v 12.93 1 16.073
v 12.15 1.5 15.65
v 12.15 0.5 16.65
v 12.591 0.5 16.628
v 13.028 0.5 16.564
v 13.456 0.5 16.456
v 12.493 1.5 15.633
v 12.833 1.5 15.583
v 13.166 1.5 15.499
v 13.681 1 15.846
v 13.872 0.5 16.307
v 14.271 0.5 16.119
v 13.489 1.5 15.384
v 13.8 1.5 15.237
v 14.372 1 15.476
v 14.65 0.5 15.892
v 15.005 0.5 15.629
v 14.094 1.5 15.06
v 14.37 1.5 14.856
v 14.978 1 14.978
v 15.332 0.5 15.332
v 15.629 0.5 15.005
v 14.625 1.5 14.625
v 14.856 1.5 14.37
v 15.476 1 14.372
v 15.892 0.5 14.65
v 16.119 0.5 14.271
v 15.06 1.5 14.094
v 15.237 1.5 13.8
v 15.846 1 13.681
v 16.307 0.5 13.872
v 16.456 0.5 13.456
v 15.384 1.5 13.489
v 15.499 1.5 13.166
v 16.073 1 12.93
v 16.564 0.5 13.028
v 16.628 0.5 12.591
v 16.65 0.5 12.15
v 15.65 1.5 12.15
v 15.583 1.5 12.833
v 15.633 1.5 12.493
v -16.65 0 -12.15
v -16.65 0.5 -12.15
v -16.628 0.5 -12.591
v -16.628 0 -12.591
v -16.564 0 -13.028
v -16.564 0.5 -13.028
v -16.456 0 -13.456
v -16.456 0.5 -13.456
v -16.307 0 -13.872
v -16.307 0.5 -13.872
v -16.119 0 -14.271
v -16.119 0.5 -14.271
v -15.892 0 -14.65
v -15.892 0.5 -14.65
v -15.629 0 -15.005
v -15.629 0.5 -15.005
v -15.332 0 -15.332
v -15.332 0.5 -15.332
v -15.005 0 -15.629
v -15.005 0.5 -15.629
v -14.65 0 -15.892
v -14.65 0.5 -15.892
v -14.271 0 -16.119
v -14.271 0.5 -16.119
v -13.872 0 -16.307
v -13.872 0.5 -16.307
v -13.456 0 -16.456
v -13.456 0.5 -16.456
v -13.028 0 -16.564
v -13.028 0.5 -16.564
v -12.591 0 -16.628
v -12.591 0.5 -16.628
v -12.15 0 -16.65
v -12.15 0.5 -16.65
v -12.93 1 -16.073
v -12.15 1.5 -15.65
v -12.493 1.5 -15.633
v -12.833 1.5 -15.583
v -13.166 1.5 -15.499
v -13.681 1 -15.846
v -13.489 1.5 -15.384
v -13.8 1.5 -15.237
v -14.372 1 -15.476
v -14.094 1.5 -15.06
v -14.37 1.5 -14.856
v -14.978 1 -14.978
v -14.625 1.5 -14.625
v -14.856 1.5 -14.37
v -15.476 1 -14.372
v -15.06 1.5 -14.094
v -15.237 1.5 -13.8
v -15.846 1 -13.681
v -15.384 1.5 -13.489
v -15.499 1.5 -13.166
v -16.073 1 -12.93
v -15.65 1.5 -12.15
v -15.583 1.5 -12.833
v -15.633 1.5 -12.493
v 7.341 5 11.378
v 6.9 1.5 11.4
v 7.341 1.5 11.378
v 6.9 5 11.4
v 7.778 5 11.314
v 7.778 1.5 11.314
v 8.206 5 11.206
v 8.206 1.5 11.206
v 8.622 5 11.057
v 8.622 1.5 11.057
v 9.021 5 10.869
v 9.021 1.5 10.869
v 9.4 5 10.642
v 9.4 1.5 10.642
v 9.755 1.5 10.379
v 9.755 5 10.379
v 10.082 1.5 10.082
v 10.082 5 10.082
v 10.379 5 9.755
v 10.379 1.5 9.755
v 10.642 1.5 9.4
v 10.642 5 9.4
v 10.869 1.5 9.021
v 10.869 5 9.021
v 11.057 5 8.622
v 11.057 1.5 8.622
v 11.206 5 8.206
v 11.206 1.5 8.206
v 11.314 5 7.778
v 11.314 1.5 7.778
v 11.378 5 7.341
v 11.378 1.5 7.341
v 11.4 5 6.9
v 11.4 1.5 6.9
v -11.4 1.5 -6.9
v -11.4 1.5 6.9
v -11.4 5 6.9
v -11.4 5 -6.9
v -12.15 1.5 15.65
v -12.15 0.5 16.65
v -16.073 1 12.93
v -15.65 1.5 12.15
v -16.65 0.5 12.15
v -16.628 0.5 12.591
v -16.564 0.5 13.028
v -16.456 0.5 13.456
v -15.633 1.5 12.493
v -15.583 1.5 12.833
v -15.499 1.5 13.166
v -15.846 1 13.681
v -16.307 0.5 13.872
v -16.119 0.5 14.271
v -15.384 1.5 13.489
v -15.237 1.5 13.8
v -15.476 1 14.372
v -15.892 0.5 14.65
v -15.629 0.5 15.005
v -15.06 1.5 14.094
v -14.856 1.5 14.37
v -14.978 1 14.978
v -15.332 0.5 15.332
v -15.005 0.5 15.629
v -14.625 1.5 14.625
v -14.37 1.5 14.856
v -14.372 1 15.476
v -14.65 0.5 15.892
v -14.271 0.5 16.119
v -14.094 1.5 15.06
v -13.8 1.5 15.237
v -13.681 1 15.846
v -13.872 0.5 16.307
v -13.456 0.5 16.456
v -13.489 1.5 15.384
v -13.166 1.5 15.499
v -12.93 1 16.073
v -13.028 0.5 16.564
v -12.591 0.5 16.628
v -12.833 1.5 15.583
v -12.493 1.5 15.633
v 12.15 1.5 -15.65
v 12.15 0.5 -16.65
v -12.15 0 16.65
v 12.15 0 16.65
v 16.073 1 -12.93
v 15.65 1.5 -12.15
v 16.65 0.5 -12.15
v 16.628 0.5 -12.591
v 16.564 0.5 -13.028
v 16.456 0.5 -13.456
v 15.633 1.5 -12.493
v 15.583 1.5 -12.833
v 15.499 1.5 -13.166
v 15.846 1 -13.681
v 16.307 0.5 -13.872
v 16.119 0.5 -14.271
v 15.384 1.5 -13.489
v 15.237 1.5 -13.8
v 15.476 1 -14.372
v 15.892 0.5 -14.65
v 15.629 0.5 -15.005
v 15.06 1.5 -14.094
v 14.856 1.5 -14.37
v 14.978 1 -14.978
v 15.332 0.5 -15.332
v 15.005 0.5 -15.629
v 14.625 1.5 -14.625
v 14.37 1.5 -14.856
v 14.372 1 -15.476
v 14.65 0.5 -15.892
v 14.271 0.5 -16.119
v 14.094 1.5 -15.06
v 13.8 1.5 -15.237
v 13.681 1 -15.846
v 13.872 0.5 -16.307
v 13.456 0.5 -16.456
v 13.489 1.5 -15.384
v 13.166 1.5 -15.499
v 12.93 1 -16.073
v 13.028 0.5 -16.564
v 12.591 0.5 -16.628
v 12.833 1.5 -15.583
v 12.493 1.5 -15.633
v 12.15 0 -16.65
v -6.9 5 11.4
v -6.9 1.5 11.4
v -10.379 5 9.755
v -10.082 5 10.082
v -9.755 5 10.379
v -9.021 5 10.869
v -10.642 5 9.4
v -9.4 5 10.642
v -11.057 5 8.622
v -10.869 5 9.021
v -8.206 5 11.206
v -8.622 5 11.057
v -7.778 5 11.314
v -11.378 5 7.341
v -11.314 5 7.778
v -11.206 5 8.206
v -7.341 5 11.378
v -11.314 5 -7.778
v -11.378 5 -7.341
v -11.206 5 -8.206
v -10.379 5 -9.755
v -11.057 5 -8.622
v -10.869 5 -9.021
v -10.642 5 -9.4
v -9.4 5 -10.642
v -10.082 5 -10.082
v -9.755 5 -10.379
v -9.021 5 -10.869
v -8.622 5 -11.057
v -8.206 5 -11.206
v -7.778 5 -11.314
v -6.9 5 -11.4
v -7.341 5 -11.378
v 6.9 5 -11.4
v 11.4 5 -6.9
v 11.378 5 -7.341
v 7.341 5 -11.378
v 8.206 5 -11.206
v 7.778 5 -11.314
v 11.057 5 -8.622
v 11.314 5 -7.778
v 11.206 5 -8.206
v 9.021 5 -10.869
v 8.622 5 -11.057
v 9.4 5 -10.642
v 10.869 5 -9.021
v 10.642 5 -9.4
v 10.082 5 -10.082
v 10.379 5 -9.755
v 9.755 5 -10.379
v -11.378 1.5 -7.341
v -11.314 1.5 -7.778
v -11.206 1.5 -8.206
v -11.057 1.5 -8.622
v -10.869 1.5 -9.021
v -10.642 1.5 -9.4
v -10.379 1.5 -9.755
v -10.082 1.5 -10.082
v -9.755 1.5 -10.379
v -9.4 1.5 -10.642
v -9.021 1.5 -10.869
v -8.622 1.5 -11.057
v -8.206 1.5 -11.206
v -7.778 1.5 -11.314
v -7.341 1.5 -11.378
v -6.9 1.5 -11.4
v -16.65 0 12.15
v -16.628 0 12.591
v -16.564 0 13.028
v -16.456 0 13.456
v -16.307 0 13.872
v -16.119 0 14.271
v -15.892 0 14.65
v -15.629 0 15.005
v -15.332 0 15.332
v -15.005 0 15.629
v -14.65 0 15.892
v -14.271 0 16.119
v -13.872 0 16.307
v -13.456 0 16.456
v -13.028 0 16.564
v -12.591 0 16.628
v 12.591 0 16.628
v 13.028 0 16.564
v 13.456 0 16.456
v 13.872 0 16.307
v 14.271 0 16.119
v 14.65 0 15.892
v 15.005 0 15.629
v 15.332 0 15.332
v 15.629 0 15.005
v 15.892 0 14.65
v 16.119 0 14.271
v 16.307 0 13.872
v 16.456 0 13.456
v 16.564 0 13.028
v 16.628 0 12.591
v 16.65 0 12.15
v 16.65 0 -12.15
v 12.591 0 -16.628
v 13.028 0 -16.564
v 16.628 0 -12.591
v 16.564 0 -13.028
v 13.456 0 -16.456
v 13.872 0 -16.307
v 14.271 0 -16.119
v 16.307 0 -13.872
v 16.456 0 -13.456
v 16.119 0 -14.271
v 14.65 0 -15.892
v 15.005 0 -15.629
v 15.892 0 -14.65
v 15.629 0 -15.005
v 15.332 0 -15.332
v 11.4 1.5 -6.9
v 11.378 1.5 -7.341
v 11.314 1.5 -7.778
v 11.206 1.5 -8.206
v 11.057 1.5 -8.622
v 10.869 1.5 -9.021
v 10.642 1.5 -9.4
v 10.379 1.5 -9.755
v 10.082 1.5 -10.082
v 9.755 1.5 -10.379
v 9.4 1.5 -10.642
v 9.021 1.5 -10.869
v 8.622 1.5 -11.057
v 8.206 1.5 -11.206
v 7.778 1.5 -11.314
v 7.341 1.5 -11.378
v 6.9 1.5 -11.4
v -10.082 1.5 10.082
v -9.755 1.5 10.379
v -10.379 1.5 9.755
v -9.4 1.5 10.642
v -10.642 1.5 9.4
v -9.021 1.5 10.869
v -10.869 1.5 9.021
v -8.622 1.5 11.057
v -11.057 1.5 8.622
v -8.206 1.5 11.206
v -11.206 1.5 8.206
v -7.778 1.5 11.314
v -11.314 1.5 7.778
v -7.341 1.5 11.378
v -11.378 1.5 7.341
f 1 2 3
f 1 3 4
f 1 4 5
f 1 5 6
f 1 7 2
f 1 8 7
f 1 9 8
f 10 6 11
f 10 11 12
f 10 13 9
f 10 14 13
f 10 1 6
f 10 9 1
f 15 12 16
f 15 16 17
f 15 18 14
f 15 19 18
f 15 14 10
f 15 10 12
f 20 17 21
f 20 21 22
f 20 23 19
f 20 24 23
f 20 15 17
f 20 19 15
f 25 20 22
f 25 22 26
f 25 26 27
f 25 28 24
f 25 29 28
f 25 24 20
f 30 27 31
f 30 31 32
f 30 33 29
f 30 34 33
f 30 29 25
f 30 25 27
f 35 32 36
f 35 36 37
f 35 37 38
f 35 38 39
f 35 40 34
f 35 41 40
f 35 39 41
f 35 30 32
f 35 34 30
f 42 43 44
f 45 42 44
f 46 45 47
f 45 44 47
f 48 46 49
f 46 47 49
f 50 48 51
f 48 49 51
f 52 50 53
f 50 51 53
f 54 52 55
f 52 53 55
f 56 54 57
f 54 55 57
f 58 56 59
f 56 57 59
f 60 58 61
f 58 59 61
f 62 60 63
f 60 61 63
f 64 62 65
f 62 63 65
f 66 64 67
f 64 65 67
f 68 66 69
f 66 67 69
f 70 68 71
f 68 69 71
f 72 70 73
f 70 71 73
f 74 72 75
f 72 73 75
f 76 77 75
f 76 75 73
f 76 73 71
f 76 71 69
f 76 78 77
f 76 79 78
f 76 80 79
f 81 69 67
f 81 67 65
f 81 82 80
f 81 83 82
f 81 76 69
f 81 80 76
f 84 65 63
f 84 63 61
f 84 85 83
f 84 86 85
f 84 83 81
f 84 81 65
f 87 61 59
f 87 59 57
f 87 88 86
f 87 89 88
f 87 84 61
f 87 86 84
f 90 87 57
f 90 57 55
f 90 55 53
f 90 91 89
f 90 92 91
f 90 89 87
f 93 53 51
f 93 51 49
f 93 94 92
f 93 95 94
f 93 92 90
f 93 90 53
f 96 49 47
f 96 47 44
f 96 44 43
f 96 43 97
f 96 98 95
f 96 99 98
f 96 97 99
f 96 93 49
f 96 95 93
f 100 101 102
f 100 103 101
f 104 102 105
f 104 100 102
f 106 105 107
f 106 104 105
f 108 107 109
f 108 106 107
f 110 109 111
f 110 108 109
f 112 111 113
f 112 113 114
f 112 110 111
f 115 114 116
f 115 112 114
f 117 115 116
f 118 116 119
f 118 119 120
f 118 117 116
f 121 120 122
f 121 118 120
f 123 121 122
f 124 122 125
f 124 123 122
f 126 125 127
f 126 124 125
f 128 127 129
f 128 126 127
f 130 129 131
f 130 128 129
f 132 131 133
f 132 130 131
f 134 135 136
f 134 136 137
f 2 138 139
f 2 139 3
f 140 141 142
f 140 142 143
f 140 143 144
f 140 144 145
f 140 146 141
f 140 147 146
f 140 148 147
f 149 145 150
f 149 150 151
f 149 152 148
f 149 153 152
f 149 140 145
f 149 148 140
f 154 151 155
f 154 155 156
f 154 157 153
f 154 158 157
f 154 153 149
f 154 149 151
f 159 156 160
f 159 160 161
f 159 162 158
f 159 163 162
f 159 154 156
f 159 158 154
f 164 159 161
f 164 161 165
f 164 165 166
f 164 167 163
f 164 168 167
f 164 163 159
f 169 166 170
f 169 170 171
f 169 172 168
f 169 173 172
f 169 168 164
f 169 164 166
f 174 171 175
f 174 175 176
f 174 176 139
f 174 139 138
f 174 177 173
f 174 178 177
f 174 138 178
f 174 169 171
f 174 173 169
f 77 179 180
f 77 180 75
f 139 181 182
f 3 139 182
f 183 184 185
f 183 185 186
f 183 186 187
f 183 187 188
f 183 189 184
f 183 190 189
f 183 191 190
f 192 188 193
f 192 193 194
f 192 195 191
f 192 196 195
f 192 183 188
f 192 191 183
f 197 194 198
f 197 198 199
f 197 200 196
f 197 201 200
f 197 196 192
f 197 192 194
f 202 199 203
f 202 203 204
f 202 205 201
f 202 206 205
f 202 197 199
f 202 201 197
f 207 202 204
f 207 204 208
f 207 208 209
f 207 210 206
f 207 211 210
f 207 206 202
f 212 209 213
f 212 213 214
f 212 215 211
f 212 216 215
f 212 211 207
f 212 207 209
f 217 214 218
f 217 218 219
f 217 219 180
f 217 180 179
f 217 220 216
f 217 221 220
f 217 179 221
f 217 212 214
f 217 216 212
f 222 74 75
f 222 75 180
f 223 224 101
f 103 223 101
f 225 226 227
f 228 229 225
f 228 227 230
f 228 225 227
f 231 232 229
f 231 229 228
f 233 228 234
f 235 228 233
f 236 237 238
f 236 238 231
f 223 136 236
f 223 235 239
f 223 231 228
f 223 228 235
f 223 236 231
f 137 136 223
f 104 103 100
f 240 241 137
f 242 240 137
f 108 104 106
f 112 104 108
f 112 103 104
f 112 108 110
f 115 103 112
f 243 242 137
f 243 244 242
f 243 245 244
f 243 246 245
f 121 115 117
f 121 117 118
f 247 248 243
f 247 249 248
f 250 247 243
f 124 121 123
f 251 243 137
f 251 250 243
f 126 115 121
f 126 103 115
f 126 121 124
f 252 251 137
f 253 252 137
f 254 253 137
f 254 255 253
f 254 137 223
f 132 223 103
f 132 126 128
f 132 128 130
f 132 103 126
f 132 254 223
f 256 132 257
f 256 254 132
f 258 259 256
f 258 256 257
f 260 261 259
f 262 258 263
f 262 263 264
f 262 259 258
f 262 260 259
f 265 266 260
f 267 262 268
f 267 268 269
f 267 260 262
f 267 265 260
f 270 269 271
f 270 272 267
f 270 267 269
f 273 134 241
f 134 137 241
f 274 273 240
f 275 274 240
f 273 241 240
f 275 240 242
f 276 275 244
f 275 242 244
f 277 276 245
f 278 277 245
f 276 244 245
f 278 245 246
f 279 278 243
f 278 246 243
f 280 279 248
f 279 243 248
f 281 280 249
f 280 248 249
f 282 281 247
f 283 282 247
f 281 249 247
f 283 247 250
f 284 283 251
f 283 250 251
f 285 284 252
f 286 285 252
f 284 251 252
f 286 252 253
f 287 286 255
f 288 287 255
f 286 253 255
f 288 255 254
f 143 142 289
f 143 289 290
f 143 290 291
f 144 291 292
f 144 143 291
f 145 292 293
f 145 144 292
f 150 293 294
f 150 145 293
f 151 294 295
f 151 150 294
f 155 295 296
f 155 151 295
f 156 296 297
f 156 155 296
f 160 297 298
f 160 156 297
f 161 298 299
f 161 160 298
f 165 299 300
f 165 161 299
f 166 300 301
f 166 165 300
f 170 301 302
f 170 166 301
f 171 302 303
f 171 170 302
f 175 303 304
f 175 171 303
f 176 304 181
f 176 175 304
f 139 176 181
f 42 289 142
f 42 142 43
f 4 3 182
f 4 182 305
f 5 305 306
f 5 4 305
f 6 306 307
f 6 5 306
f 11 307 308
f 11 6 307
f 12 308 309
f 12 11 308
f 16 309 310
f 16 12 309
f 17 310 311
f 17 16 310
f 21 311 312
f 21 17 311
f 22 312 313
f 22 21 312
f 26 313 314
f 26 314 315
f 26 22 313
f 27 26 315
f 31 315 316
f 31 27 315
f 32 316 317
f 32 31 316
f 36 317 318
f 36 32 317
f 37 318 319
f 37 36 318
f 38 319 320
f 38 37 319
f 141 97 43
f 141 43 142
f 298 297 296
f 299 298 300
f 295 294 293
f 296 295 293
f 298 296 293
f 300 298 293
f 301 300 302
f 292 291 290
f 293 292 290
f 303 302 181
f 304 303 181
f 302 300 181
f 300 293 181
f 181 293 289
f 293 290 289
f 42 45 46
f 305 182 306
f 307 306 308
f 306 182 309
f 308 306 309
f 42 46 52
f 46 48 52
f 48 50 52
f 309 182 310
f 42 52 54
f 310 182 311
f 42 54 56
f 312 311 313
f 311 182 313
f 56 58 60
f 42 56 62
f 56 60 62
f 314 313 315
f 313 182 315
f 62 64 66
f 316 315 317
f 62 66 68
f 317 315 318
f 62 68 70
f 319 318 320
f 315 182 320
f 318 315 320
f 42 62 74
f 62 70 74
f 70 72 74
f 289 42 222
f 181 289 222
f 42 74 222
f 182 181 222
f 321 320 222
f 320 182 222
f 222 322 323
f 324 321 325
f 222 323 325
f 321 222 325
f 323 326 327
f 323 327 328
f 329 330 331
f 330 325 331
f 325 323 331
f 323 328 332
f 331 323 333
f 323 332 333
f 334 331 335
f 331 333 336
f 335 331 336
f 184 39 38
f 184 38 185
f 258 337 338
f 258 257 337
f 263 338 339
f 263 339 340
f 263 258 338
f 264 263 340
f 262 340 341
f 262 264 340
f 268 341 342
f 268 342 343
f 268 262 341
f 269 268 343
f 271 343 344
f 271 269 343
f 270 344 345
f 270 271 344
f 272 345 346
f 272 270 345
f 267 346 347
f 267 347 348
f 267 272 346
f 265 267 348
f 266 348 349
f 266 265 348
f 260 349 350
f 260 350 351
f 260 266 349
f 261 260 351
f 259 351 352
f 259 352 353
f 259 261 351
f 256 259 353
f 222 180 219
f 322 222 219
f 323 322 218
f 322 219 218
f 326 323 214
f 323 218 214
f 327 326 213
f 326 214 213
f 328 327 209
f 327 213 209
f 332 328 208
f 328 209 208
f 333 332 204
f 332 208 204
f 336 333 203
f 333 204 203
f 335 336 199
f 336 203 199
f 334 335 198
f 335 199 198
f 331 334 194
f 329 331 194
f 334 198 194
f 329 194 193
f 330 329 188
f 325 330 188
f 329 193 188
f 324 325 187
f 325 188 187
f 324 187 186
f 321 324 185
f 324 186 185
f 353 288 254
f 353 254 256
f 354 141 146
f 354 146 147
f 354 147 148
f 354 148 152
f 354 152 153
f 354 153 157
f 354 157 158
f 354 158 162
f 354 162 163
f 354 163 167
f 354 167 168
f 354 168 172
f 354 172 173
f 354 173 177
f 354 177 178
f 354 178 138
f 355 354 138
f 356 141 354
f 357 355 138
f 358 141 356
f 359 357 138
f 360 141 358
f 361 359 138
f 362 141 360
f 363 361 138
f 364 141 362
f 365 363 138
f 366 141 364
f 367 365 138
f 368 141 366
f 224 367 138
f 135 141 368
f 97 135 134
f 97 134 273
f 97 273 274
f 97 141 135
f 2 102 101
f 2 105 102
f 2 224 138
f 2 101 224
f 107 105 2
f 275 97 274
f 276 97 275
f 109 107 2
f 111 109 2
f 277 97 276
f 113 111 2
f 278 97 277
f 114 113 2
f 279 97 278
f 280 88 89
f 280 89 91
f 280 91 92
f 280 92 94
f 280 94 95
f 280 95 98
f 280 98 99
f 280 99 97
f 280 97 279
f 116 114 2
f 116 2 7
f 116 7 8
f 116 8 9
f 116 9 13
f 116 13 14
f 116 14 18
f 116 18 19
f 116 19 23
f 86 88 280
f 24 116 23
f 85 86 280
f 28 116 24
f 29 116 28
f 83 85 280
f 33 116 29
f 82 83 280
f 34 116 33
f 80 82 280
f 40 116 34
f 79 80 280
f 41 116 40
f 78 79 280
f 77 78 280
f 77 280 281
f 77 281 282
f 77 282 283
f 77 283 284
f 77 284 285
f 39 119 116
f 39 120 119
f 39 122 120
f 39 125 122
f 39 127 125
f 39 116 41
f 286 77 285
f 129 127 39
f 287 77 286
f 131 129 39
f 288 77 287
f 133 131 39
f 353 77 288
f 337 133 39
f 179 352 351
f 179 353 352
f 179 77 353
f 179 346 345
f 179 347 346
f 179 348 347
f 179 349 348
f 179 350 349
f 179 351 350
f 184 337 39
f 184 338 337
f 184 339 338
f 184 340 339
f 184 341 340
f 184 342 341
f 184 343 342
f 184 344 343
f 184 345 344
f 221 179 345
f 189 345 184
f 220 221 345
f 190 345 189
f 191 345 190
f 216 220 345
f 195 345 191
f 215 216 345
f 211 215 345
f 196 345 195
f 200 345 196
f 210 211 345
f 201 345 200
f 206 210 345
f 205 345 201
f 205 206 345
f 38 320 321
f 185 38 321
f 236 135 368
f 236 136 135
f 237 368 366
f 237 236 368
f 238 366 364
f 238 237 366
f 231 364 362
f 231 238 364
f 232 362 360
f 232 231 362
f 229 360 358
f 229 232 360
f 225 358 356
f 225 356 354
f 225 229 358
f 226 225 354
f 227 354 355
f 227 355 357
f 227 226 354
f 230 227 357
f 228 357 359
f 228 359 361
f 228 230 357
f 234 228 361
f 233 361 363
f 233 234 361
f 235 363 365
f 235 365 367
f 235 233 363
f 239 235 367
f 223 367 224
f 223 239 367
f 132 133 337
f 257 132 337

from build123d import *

# Parameters (mm, degrees)
SKETCH1_W           = 33.3
SKETCH1_H           = 33.3
BOSS_EXTRUDE1_DEPTH = 1.5
SKETCH1_3_W         = 22.8
SKETCH1_3_H         = 22.8
BOSS_EXTRUDE2_DEPTH = 5
FILLET1_R           = 4.5
CHAMFER1_SIZE       = 1


with BuildPart() as part:
    # Sketch1 → Boss-Extrude1 (new body)
    with BuildSketch(Plane(origin=(0, 0, 0), x_dir=(1, 0, 0), z_dir=(0, 1, 0))):
        Rectangle(SKETCH1_W, SKETCH1_H)
    extrude(amount=BOSS_EXTRUDE1_DEPTH)

    # Sketch1<3> → Boss-Extrude2 (add)
    with BuildSketch(Plane(origin=(0, 0, 0), x_dir=(1, 0, 0), z_dir=(0, 1, 0))):
        Rectangle(SKETCH1_3_W, SKETCH1_3_H)
    extrude(amount=BOSS_EXTRUDE2_DEPTH)

    # Fillet1
    fillet1_edges = [part.edges().sort_by_distance(p)[0] for p in [
        (16.65, 0.75, 16.65),
        (11.4, 3.25, 11.4),
        (11.4, 3.25, -11.4),
        (16.65, 0.75, -16.65),
        (-16.65, 0.75, -16.65),
        (-11.4, 3.25, -11.4),
        (-11.4, 3.25, 11.4),
        (-16.65, 0.75, 16.65),
    ]]
    fillet(fillet1_edges, radius=FILLET1_R)

    # Chamfer1
    chamfer1_edges = [part.edges().sort_by_distance(p)[0] for p in [
        (15.331980515, 1.5, -15.331980515),
        (16.65, 1.5, 0),
        (15.331980515, 1.5, 15.331980515),
        (0, 1.5, 16.65),
        (-15.331980515, 1.5, 15.331980515),
        (-16.65, 1.5, 0),
        (-15.331980515, 1.5, -15.331980515),
        (0, 1.5, -16.65),
    ]]
    chamfer(chamfer1_edges, length=CHAMFER1_SIZE)


solid = part.part
